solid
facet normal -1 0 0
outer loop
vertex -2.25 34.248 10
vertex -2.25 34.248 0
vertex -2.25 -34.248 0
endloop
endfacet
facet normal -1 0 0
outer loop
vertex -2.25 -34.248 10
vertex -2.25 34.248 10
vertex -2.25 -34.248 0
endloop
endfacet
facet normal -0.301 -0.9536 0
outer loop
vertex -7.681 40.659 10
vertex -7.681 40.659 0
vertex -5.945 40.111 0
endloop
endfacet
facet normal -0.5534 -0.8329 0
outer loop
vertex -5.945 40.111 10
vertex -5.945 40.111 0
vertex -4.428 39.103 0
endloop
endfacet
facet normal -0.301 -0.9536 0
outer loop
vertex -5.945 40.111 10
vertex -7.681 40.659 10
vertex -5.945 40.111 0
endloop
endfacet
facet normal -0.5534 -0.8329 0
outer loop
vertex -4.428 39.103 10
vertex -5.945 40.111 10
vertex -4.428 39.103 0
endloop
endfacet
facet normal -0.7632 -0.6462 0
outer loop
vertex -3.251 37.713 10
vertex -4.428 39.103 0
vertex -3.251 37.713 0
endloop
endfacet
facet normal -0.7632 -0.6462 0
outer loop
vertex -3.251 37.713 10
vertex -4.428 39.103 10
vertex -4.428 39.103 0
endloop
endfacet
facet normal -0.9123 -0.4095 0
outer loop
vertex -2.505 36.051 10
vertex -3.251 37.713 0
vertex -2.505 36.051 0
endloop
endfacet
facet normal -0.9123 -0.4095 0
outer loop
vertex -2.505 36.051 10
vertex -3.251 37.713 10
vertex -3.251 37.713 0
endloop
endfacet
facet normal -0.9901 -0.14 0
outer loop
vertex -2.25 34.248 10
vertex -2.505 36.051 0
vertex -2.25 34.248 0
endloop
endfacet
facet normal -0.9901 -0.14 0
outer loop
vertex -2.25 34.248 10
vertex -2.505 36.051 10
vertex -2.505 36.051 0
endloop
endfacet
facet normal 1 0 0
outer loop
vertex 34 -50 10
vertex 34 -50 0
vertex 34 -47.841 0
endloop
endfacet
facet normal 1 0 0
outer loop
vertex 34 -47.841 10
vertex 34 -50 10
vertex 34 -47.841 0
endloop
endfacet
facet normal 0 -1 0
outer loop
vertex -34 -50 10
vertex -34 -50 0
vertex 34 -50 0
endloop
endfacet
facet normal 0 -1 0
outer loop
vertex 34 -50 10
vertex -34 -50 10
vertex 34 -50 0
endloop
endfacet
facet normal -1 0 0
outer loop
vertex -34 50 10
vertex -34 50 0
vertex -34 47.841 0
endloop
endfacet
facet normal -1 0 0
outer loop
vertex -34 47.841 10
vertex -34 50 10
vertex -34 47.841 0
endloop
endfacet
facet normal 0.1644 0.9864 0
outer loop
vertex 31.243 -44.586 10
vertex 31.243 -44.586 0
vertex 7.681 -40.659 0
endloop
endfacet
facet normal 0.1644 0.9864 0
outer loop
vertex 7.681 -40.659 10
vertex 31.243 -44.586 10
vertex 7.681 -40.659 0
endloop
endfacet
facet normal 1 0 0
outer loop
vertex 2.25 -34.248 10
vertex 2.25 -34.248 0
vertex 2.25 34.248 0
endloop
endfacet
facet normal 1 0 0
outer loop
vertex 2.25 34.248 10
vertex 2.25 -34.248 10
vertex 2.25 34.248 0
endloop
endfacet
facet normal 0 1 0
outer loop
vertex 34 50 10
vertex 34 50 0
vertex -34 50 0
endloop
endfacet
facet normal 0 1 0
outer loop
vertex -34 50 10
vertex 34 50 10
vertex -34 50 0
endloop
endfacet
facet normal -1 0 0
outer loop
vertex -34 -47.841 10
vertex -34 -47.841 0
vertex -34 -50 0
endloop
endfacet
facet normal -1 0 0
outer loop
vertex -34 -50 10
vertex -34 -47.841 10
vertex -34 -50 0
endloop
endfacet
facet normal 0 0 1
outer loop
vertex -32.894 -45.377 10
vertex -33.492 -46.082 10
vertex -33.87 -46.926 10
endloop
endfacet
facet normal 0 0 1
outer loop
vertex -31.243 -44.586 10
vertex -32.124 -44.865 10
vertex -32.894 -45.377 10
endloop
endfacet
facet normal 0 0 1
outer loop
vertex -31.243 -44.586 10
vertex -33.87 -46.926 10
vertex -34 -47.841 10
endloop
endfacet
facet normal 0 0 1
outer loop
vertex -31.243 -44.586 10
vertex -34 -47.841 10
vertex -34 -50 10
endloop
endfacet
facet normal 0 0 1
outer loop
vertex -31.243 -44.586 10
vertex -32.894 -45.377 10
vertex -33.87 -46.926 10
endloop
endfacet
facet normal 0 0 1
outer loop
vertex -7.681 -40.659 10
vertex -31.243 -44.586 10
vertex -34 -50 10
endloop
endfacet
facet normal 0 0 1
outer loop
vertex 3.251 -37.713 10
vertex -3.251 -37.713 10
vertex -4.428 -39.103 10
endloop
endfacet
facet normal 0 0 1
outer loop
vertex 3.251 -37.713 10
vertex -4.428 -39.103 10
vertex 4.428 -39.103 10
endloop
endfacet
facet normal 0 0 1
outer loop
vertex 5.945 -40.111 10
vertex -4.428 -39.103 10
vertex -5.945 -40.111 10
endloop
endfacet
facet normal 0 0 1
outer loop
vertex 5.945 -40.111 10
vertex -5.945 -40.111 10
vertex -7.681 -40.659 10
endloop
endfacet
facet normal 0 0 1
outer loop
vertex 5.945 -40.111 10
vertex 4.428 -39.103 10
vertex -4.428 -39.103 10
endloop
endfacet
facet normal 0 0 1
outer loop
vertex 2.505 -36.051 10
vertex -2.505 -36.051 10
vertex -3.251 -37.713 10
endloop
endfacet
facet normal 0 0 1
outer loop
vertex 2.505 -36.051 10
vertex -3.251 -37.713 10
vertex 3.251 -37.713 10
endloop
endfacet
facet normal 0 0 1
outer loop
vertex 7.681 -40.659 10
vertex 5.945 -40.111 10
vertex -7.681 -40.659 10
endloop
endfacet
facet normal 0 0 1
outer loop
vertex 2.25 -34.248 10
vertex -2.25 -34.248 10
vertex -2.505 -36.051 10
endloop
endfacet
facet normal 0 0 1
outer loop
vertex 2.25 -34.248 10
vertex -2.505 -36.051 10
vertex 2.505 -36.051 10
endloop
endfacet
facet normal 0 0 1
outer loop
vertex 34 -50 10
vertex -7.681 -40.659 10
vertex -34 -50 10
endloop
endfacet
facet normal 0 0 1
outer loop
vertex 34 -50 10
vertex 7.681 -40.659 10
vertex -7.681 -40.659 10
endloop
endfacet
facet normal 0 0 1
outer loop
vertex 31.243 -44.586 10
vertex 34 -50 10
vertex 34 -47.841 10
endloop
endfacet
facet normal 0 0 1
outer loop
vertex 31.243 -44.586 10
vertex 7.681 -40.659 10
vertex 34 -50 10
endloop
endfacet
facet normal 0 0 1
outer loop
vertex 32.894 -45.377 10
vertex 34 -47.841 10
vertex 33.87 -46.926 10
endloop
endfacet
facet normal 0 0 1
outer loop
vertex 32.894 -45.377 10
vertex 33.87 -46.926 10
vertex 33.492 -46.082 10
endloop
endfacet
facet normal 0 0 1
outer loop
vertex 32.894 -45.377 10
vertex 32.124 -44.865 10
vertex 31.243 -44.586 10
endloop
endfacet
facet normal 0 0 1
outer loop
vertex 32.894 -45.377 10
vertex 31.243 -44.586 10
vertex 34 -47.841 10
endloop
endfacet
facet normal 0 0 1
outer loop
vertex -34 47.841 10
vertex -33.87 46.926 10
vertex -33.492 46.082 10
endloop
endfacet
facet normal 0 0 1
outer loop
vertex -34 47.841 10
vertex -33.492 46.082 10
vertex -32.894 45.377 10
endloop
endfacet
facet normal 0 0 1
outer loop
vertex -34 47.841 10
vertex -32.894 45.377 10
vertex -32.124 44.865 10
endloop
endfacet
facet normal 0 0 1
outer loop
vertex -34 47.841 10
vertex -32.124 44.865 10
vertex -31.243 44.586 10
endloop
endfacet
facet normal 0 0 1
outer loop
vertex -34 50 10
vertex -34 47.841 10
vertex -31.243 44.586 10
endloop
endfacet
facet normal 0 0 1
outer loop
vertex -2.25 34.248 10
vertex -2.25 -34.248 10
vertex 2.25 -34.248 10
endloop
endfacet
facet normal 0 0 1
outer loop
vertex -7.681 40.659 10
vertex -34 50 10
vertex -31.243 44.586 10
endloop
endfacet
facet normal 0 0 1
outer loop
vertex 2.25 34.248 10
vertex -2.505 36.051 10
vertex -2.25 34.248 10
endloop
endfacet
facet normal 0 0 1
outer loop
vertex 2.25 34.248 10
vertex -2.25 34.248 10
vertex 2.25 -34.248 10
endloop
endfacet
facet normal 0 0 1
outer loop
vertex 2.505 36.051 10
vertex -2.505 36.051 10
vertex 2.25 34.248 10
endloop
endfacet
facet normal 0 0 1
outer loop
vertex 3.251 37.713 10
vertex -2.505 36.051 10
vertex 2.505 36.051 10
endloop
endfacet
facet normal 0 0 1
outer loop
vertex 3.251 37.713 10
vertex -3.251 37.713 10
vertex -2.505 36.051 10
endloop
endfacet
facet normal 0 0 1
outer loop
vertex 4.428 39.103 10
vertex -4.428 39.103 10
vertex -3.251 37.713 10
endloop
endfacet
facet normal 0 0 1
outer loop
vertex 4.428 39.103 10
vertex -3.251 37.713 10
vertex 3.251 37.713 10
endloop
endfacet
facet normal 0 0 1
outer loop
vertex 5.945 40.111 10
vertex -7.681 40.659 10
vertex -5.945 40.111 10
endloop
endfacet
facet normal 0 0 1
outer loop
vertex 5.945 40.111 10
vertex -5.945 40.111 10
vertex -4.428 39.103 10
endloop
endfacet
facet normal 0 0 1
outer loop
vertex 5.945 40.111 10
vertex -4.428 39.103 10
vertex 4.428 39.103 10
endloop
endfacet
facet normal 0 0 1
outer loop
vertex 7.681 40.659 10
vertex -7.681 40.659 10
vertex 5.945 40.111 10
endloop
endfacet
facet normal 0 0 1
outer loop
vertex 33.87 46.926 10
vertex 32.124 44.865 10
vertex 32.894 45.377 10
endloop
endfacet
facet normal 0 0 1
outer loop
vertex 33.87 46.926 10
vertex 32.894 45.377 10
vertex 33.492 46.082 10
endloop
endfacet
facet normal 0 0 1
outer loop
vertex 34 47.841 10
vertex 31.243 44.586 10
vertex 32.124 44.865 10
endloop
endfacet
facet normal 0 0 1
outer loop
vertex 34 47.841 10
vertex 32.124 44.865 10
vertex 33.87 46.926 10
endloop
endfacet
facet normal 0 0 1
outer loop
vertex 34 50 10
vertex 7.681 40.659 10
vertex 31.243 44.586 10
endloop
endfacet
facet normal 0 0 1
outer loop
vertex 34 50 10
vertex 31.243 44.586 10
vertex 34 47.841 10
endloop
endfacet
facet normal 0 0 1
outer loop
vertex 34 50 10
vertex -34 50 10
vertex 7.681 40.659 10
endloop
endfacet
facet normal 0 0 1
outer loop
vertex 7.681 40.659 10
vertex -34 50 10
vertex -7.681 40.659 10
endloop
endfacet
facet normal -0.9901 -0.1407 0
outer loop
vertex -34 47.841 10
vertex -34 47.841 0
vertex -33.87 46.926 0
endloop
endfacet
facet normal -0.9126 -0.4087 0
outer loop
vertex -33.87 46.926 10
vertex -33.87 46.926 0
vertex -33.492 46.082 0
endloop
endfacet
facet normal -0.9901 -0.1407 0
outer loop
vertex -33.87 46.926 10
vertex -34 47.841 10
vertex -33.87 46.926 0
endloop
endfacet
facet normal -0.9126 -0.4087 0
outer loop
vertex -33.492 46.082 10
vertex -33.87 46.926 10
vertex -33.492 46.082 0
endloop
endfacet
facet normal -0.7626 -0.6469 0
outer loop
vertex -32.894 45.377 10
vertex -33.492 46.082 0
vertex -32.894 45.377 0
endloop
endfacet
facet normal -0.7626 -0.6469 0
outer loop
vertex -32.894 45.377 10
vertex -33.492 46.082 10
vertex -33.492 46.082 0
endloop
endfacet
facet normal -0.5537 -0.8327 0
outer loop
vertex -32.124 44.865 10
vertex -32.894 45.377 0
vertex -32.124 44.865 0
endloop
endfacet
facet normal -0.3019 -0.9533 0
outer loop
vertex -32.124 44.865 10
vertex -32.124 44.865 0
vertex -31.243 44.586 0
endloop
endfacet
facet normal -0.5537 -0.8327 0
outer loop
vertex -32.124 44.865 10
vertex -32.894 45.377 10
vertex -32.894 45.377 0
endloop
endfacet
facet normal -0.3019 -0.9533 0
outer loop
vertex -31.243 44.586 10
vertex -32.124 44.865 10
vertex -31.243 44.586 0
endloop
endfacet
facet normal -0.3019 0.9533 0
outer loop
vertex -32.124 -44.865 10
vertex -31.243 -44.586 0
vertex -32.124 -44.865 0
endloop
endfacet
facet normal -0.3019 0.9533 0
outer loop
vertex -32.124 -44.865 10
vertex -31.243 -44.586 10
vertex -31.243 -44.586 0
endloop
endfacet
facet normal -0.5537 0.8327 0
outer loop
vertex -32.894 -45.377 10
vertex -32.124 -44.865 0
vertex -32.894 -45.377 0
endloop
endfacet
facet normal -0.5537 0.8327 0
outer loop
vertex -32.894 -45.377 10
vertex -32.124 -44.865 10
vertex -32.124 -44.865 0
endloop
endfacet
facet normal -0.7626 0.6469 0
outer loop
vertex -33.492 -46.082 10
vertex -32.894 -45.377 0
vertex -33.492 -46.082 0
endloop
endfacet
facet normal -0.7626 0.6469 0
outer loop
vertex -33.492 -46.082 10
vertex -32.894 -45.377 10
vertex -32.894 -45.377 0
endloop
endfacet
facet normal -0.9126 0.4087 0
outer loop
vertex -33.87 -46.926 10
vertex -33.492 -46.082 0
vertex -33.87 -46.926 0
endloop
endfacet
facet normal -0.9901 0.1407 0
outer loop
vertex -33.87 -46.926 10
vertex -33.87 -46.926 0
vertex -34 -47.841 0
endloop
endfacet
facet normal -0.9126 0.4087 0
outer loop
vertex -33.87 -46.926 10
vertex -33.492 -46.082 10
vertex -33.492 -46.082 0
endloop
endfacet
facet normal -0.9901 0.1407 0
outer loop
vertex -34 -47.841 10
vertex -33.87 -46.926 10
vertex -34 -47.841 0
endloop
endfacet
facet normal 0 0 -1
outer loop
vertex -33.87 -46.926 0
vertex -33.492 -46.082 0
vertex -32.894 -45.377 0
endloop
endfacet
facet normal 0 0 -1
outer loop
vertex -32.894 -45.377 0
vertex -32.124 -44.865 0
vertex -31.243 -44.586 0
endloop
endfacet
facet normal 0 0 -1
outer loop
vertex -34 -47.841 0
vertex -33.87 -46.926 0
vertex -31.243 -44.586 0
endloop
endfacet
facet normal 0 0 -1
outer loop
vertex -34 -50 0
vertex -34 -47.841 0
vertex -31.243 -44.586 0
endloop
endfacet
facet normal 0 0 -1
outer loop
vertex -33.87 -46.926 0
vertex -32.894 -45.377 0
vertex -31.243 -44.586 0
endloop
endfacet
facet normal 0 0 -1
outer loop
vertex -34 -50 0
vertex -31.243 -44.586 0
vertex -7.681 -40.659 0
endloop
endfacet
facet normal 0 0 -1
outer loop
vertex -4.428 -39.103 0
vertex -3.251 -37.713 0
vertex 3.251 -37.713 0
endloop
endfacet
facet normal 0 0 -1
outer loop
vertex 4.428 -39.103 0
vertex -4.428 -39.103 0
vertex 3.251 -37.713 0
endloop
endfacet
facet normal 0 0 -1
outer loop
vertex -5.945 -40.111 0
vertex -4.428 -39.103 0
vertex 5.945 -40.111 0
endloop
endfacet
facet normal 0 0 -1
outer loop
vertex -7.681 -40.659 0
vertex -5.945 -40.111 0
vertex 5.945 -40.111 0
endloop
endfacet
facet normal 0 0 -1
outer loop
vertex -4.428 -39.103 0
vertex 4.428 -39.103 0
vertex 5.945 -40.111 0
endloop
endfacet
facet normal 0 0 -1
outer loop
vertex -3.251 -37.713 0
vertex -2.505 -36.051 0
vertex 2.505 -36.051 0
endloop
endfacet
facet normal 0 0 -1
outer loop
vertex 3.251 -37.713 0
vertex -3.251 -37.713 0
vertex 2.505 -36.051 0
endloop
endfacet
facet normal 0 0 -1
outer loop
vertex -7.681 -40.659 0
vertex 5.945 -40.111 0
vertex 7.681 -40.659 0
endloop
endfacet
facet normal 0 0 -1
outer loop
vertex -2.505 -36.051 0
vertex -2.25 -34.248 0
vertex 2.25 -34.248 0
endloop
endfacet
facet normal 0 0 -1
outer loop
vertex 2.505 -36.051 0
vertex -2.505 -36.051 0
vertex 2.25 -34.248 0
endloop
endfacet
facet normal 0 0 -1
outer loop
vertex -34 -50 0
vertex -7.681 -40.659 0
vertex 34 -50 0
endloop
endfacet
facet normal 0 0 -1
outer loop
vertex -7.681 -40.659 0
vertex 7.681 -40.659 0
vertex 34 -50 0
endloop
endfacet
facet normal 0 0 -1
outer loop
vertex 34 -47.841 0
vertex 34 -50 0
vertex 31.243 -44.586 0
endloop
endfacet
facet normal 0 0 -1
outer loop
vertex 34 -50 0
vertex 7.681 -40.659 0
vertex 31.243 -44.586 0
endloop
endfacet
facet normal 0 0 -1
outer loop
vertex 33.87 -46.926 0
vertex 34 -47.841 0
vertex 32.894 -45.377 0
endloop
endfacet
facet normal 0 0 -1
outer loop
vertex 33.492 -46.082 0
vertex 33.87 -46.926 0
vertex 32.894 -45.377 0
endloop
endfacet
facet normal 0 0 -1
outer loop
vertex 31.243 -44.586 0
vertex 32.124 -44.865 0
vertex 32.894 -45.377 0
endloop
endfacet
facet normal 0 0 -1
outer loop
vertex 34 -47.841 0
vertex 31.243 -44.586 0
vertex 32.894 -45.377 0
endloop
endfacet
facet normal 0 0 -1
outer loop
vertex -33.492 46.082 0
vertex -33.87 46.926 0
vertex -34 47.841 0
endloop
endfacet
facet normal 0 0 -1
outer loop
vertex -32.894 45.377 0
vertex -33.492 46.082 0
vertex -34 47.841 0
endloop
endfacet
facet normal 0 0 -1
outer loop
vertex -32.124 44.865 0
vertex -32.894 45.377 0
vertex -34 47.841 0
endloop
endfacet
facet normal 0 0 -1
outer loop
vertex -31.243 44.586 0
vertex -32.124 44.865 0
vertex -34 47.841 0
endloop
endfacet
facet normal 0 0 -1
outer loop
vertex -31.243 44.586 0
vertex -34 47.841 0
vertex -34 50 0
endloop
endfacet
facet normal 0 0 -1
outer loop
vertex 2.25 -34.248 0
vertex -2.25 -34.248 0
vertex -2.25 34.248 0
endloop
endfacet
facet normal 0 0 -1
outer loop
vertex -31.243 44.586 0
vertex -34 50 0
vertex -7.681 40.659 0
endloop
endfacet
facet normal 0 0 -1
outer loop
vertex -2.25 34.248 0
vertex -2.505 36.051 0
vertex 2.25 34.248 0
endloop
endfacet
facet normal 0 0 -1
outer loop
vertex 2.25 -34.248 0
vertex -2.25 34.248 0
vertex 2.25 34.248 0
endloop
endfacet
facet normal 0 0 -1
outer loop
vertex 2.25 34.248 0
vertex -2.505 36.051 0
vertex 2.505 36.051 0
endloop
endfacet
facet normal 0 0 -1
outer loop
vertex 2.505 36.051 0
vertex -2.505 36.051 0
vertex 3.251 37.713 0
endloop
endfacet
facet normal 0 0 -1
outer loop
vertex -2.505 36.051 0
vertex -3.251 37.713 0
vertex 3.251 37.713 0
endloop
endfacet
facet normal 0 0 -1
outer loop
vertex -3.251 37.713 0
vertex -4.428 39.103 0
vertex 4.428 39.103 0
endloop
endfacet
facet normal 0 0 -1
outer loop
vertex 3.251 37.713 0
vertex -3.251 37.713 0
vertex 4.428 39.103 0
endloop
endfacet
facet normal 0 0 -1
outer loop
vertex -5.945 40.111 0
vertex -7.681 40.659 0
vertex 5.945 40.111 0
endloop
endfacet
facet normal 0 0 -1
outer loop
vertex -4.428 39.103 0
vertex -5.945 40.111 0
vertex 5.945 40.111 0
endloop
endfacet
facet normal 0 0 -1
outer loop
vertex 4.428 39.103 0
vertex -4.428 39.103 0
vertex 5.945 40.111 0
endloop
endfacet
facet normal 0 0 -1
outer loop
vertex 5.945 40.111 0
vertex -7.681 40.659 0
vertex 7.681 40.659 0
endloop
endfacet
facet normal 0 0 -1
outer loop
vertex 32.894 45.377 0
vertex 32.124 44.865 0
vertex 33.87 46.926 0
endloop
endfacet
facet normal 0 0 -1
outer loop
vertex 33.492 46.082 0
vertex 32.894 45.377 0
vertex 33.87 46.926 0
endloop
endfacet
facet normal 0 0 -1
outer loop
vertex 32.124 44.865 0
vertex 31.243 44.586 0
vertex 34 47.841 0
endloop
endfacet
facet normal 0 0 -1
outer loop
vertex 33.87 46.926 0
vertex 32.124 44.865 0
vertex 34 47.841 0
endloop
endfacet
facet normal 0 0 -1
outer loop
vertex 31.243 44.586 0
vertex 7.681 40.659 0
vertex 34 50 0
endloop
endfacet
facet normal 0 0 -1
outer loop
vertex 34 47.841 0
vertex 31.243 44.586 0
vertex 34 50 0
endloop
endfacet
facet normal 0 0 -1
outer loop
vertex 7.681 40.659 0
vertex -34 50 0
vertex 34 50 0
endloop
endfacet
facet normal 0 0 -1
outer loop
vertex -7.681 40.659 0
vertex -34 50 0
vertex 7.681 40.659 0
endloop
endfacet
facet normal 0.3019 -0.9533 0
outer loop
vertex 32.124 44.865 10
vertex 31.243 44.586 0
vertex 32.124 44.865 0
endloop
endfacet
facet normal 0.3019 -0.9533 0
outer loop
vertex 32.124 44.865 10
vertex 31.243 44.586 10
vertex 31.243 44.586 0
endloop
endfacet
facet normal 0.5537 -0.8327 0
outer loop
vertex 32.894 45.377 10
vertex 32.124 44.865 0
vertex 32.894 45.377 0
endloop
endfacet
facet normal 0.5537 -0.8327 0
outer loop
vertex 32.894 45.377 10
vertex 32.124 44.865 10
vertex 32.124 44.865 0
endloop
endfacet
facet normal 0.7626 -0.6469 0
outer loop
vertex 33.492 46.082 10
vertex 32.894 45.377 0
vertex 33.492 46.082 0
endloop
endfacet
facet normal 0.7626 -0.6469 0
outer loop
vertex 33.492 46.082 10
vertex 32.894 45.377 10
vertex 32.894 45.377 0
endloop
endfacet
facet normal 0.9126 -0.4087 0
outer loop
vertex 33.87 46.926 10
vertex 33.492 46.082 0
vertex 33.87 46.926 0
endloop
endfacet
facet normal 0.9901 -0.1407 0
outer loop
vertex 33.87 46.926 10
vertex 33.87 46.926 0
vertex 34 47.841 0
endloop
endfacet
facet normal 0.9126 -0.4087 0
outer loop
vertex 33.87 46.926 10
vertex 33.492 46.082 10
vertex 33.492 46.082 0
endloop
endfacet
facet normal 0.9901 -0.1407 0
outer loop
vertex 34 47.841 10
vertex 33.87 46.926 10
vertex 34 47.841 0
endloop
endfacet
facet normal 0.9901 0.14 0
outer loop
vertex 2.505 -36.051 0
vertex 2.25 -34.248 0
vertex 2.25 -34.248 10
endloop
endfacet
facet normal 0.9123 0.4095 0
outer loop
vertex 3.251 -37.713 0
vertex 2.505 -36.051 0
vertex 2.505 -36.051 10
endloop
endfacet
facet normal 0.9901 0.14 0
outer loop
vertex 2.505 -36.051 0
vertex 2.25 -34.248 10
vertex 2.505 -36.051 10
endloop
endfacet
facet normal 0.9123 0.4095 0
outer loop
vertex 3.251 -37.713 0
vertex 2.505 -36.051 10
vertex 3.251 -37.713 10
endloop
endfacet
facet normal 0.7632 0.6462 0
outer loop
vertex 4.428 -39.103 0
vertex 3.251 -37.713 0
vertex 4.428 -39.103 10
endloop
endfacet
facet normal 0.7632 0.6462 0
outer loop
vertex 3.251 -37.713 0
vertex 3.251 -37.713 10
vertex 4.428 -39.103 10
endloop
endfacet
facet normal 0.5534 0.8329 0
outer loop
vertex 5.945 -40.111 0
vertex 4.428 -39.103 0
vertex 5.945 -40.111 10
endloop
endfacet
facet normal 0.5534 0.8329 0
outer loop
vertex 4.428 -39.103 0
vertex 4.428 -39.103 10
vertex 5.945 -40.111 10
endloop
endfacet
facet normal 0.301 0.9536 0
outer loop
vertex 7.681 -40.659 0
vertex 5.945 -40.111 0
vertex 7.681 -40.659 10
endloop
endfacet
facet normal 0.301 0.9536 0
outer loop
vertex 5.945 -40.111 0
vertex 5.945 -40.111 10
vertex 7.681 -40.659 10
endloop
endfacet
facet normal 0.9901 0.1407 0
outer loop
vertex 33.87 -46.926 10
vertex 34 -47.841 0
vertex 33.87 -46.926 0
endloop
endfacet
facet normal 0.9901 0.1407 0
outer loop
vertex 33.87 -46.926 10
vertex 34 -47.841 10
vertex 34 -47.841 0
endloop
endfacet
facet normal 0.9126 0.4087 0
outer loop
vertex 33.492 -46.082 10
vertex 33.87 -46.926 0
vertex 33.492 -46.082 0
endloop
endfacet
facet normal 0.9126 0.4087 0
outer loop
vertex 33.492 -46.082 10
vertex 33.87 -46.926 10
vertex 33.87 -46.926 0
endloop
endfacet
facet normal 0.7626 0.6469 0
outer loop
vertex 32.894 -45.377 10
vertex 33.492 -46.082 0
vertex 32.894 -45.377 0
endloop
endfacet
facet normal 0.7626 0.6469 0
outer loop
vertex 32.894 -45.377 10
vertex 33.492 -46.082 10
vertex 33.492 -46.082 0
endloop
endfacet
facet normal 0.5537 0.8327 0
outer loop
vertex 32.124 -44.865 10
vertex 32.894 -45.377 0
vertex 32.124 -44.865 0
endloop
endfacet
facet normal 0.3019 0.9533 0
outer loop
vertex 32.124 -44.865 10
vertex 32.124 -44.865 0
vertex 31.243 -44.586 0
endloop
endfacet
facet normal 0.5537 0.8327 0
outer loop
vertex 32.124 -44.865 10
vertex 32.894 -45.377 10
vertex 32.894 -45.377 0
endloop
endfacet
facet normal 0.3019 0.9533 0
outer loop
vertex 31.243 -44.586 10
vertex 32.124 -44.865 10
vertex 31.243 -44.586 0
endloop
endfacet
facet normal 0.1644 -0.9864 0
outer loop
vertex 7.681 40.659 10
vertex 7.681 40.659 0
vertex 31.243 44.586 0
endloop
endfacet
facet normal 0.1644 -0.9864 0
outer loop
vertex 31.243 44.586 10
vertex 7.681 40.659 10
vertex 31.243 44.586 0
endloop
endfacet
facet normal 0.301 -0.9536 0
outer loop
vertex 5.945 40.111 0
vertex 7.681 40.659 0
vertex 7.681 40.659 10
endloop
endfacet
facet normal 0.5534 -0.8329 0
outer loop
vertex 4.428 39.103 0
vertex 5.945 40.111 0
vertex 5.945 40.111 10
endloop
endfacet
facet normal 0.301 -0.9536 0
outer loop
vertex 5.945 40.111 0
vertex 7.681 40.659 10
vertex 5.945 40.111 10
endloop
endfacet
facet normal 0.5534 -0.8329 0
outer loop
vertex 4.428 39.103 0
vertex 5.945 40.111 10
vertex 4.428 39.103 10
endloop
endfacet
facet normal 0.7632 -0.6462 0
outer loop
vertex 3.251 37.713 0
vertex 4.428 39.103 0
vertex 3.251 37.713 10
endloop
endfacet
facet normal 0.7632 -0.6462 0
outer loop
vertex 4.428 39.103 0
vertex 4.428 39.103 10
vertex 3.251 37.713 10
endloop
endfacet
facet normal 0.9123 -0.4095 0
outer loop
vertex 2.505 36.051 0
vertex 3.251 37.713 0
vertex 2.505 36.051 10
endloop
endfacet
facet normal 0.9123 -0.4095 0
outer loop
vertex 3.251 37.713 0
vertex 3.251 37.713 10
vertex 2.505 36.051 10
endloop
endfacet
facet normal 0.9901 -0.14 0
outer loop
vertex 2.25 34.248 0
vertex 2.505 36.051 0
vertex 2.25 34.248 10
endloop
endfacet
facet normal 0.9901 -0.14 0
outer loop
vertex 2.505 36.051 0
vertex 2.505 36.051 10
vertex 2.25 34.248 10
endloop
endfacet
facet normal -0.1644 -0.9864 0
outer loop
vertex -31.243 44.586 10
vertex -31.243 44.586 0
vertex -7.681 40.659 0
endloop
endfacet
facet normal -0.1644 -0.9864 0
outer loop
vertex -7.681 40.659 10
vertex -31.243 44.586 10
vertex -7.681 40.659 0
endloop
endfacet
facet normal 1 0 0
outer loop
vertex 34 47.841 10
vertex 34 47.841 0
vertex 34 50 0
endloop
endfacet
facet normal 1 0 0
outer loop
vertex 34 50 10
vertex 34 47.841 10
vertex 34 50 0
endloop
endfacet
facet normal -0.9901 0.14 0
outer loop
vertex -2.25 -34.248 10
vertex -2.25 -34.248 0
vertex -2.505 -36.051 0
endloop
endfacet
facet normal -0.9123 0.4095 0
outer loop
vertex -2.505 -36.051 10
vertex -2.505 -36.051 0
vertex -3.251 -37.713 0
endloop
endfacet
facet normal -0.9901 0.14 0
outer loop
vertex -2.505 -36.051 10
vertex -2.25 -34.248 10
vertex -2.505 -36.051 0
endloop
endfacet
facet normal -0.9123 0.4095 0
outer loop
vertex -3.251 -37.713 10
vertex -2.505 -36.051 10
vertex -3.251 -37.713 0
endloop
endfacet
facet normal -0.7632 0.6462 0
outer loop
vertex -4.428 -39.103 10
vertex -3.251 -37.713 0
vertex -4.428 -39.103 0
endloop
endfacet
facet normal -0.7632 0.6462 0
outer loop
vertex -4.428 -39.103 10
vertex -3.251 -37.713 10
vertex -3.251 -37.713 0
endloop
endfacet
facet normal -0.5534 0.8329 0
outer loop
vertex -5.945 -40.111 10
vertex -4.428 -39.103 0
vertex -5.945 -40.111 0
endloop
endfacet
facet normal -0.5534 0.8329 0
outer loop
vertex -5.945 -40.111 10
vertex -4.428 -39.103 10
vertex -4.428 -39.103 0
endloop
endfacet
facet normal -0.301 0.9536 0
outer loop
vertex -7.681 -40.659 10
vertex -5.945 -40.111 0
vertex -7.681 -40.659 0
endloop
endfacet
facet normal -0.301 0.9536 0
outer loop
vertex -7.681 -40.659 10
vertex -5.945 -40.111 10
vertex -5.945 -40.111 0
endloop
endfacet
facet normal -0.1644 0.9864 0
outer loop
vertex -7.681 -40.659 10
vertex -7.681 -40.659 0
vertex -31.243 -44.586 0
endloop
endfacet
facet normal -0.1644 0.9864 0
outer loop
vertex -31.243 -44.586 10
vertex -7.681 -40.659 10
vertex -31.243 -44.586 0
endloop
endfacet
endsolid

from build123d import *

# Parameters (mm, degrees)
EXTRUDE_1_DEPTH = 10
FILLET_1_R      = 3.3
FILLET_2_R      = 6.5


with BuildPart() as part:
    # 草图1 → 凸台-拉伸1 (new body)
    with BuildSketch(Plane.XY):
        Polygon((34, 50), (-34, 50), (-34, 45.045833333), (-2.25, 39.754166667), (-2.25, -39.754166667), (-34, -45.045833333), (-34, -50), (34, -50), (34, -45.045833333), (2.25, -39.754166667), (2.25, 39.754166667), (34, 45.045833333), align=None)
    extrude(amount=EXTRUDE_1_DEPTH)

    # 圆角1
    fillet_1_edges = [part.edges().sort_by_distance(p)[0] for p in [
        (-34, -45.045833333, 5),
        (-34, 45.045833333, 5),
        (34, 45.045833333, 5),
        (34, -45.045833333, 5),
    ]]
    fillet(fillet_1_edges, radius=FILLET_1_R)

    # 圆角2
    fillet_2_edges = [part.edges().sort_by_distance(p)[0] for p in [
        (-2.25, -39.754166667, 5),
        (-2.25, 39.754166667, 5),
        (2.25, 39.754166667, 5),
        (2.25, -39.754166667, 5),
    ]]
    fillet(fillet_2_edges, radius=FILLET_2_R)


solid = part.part
